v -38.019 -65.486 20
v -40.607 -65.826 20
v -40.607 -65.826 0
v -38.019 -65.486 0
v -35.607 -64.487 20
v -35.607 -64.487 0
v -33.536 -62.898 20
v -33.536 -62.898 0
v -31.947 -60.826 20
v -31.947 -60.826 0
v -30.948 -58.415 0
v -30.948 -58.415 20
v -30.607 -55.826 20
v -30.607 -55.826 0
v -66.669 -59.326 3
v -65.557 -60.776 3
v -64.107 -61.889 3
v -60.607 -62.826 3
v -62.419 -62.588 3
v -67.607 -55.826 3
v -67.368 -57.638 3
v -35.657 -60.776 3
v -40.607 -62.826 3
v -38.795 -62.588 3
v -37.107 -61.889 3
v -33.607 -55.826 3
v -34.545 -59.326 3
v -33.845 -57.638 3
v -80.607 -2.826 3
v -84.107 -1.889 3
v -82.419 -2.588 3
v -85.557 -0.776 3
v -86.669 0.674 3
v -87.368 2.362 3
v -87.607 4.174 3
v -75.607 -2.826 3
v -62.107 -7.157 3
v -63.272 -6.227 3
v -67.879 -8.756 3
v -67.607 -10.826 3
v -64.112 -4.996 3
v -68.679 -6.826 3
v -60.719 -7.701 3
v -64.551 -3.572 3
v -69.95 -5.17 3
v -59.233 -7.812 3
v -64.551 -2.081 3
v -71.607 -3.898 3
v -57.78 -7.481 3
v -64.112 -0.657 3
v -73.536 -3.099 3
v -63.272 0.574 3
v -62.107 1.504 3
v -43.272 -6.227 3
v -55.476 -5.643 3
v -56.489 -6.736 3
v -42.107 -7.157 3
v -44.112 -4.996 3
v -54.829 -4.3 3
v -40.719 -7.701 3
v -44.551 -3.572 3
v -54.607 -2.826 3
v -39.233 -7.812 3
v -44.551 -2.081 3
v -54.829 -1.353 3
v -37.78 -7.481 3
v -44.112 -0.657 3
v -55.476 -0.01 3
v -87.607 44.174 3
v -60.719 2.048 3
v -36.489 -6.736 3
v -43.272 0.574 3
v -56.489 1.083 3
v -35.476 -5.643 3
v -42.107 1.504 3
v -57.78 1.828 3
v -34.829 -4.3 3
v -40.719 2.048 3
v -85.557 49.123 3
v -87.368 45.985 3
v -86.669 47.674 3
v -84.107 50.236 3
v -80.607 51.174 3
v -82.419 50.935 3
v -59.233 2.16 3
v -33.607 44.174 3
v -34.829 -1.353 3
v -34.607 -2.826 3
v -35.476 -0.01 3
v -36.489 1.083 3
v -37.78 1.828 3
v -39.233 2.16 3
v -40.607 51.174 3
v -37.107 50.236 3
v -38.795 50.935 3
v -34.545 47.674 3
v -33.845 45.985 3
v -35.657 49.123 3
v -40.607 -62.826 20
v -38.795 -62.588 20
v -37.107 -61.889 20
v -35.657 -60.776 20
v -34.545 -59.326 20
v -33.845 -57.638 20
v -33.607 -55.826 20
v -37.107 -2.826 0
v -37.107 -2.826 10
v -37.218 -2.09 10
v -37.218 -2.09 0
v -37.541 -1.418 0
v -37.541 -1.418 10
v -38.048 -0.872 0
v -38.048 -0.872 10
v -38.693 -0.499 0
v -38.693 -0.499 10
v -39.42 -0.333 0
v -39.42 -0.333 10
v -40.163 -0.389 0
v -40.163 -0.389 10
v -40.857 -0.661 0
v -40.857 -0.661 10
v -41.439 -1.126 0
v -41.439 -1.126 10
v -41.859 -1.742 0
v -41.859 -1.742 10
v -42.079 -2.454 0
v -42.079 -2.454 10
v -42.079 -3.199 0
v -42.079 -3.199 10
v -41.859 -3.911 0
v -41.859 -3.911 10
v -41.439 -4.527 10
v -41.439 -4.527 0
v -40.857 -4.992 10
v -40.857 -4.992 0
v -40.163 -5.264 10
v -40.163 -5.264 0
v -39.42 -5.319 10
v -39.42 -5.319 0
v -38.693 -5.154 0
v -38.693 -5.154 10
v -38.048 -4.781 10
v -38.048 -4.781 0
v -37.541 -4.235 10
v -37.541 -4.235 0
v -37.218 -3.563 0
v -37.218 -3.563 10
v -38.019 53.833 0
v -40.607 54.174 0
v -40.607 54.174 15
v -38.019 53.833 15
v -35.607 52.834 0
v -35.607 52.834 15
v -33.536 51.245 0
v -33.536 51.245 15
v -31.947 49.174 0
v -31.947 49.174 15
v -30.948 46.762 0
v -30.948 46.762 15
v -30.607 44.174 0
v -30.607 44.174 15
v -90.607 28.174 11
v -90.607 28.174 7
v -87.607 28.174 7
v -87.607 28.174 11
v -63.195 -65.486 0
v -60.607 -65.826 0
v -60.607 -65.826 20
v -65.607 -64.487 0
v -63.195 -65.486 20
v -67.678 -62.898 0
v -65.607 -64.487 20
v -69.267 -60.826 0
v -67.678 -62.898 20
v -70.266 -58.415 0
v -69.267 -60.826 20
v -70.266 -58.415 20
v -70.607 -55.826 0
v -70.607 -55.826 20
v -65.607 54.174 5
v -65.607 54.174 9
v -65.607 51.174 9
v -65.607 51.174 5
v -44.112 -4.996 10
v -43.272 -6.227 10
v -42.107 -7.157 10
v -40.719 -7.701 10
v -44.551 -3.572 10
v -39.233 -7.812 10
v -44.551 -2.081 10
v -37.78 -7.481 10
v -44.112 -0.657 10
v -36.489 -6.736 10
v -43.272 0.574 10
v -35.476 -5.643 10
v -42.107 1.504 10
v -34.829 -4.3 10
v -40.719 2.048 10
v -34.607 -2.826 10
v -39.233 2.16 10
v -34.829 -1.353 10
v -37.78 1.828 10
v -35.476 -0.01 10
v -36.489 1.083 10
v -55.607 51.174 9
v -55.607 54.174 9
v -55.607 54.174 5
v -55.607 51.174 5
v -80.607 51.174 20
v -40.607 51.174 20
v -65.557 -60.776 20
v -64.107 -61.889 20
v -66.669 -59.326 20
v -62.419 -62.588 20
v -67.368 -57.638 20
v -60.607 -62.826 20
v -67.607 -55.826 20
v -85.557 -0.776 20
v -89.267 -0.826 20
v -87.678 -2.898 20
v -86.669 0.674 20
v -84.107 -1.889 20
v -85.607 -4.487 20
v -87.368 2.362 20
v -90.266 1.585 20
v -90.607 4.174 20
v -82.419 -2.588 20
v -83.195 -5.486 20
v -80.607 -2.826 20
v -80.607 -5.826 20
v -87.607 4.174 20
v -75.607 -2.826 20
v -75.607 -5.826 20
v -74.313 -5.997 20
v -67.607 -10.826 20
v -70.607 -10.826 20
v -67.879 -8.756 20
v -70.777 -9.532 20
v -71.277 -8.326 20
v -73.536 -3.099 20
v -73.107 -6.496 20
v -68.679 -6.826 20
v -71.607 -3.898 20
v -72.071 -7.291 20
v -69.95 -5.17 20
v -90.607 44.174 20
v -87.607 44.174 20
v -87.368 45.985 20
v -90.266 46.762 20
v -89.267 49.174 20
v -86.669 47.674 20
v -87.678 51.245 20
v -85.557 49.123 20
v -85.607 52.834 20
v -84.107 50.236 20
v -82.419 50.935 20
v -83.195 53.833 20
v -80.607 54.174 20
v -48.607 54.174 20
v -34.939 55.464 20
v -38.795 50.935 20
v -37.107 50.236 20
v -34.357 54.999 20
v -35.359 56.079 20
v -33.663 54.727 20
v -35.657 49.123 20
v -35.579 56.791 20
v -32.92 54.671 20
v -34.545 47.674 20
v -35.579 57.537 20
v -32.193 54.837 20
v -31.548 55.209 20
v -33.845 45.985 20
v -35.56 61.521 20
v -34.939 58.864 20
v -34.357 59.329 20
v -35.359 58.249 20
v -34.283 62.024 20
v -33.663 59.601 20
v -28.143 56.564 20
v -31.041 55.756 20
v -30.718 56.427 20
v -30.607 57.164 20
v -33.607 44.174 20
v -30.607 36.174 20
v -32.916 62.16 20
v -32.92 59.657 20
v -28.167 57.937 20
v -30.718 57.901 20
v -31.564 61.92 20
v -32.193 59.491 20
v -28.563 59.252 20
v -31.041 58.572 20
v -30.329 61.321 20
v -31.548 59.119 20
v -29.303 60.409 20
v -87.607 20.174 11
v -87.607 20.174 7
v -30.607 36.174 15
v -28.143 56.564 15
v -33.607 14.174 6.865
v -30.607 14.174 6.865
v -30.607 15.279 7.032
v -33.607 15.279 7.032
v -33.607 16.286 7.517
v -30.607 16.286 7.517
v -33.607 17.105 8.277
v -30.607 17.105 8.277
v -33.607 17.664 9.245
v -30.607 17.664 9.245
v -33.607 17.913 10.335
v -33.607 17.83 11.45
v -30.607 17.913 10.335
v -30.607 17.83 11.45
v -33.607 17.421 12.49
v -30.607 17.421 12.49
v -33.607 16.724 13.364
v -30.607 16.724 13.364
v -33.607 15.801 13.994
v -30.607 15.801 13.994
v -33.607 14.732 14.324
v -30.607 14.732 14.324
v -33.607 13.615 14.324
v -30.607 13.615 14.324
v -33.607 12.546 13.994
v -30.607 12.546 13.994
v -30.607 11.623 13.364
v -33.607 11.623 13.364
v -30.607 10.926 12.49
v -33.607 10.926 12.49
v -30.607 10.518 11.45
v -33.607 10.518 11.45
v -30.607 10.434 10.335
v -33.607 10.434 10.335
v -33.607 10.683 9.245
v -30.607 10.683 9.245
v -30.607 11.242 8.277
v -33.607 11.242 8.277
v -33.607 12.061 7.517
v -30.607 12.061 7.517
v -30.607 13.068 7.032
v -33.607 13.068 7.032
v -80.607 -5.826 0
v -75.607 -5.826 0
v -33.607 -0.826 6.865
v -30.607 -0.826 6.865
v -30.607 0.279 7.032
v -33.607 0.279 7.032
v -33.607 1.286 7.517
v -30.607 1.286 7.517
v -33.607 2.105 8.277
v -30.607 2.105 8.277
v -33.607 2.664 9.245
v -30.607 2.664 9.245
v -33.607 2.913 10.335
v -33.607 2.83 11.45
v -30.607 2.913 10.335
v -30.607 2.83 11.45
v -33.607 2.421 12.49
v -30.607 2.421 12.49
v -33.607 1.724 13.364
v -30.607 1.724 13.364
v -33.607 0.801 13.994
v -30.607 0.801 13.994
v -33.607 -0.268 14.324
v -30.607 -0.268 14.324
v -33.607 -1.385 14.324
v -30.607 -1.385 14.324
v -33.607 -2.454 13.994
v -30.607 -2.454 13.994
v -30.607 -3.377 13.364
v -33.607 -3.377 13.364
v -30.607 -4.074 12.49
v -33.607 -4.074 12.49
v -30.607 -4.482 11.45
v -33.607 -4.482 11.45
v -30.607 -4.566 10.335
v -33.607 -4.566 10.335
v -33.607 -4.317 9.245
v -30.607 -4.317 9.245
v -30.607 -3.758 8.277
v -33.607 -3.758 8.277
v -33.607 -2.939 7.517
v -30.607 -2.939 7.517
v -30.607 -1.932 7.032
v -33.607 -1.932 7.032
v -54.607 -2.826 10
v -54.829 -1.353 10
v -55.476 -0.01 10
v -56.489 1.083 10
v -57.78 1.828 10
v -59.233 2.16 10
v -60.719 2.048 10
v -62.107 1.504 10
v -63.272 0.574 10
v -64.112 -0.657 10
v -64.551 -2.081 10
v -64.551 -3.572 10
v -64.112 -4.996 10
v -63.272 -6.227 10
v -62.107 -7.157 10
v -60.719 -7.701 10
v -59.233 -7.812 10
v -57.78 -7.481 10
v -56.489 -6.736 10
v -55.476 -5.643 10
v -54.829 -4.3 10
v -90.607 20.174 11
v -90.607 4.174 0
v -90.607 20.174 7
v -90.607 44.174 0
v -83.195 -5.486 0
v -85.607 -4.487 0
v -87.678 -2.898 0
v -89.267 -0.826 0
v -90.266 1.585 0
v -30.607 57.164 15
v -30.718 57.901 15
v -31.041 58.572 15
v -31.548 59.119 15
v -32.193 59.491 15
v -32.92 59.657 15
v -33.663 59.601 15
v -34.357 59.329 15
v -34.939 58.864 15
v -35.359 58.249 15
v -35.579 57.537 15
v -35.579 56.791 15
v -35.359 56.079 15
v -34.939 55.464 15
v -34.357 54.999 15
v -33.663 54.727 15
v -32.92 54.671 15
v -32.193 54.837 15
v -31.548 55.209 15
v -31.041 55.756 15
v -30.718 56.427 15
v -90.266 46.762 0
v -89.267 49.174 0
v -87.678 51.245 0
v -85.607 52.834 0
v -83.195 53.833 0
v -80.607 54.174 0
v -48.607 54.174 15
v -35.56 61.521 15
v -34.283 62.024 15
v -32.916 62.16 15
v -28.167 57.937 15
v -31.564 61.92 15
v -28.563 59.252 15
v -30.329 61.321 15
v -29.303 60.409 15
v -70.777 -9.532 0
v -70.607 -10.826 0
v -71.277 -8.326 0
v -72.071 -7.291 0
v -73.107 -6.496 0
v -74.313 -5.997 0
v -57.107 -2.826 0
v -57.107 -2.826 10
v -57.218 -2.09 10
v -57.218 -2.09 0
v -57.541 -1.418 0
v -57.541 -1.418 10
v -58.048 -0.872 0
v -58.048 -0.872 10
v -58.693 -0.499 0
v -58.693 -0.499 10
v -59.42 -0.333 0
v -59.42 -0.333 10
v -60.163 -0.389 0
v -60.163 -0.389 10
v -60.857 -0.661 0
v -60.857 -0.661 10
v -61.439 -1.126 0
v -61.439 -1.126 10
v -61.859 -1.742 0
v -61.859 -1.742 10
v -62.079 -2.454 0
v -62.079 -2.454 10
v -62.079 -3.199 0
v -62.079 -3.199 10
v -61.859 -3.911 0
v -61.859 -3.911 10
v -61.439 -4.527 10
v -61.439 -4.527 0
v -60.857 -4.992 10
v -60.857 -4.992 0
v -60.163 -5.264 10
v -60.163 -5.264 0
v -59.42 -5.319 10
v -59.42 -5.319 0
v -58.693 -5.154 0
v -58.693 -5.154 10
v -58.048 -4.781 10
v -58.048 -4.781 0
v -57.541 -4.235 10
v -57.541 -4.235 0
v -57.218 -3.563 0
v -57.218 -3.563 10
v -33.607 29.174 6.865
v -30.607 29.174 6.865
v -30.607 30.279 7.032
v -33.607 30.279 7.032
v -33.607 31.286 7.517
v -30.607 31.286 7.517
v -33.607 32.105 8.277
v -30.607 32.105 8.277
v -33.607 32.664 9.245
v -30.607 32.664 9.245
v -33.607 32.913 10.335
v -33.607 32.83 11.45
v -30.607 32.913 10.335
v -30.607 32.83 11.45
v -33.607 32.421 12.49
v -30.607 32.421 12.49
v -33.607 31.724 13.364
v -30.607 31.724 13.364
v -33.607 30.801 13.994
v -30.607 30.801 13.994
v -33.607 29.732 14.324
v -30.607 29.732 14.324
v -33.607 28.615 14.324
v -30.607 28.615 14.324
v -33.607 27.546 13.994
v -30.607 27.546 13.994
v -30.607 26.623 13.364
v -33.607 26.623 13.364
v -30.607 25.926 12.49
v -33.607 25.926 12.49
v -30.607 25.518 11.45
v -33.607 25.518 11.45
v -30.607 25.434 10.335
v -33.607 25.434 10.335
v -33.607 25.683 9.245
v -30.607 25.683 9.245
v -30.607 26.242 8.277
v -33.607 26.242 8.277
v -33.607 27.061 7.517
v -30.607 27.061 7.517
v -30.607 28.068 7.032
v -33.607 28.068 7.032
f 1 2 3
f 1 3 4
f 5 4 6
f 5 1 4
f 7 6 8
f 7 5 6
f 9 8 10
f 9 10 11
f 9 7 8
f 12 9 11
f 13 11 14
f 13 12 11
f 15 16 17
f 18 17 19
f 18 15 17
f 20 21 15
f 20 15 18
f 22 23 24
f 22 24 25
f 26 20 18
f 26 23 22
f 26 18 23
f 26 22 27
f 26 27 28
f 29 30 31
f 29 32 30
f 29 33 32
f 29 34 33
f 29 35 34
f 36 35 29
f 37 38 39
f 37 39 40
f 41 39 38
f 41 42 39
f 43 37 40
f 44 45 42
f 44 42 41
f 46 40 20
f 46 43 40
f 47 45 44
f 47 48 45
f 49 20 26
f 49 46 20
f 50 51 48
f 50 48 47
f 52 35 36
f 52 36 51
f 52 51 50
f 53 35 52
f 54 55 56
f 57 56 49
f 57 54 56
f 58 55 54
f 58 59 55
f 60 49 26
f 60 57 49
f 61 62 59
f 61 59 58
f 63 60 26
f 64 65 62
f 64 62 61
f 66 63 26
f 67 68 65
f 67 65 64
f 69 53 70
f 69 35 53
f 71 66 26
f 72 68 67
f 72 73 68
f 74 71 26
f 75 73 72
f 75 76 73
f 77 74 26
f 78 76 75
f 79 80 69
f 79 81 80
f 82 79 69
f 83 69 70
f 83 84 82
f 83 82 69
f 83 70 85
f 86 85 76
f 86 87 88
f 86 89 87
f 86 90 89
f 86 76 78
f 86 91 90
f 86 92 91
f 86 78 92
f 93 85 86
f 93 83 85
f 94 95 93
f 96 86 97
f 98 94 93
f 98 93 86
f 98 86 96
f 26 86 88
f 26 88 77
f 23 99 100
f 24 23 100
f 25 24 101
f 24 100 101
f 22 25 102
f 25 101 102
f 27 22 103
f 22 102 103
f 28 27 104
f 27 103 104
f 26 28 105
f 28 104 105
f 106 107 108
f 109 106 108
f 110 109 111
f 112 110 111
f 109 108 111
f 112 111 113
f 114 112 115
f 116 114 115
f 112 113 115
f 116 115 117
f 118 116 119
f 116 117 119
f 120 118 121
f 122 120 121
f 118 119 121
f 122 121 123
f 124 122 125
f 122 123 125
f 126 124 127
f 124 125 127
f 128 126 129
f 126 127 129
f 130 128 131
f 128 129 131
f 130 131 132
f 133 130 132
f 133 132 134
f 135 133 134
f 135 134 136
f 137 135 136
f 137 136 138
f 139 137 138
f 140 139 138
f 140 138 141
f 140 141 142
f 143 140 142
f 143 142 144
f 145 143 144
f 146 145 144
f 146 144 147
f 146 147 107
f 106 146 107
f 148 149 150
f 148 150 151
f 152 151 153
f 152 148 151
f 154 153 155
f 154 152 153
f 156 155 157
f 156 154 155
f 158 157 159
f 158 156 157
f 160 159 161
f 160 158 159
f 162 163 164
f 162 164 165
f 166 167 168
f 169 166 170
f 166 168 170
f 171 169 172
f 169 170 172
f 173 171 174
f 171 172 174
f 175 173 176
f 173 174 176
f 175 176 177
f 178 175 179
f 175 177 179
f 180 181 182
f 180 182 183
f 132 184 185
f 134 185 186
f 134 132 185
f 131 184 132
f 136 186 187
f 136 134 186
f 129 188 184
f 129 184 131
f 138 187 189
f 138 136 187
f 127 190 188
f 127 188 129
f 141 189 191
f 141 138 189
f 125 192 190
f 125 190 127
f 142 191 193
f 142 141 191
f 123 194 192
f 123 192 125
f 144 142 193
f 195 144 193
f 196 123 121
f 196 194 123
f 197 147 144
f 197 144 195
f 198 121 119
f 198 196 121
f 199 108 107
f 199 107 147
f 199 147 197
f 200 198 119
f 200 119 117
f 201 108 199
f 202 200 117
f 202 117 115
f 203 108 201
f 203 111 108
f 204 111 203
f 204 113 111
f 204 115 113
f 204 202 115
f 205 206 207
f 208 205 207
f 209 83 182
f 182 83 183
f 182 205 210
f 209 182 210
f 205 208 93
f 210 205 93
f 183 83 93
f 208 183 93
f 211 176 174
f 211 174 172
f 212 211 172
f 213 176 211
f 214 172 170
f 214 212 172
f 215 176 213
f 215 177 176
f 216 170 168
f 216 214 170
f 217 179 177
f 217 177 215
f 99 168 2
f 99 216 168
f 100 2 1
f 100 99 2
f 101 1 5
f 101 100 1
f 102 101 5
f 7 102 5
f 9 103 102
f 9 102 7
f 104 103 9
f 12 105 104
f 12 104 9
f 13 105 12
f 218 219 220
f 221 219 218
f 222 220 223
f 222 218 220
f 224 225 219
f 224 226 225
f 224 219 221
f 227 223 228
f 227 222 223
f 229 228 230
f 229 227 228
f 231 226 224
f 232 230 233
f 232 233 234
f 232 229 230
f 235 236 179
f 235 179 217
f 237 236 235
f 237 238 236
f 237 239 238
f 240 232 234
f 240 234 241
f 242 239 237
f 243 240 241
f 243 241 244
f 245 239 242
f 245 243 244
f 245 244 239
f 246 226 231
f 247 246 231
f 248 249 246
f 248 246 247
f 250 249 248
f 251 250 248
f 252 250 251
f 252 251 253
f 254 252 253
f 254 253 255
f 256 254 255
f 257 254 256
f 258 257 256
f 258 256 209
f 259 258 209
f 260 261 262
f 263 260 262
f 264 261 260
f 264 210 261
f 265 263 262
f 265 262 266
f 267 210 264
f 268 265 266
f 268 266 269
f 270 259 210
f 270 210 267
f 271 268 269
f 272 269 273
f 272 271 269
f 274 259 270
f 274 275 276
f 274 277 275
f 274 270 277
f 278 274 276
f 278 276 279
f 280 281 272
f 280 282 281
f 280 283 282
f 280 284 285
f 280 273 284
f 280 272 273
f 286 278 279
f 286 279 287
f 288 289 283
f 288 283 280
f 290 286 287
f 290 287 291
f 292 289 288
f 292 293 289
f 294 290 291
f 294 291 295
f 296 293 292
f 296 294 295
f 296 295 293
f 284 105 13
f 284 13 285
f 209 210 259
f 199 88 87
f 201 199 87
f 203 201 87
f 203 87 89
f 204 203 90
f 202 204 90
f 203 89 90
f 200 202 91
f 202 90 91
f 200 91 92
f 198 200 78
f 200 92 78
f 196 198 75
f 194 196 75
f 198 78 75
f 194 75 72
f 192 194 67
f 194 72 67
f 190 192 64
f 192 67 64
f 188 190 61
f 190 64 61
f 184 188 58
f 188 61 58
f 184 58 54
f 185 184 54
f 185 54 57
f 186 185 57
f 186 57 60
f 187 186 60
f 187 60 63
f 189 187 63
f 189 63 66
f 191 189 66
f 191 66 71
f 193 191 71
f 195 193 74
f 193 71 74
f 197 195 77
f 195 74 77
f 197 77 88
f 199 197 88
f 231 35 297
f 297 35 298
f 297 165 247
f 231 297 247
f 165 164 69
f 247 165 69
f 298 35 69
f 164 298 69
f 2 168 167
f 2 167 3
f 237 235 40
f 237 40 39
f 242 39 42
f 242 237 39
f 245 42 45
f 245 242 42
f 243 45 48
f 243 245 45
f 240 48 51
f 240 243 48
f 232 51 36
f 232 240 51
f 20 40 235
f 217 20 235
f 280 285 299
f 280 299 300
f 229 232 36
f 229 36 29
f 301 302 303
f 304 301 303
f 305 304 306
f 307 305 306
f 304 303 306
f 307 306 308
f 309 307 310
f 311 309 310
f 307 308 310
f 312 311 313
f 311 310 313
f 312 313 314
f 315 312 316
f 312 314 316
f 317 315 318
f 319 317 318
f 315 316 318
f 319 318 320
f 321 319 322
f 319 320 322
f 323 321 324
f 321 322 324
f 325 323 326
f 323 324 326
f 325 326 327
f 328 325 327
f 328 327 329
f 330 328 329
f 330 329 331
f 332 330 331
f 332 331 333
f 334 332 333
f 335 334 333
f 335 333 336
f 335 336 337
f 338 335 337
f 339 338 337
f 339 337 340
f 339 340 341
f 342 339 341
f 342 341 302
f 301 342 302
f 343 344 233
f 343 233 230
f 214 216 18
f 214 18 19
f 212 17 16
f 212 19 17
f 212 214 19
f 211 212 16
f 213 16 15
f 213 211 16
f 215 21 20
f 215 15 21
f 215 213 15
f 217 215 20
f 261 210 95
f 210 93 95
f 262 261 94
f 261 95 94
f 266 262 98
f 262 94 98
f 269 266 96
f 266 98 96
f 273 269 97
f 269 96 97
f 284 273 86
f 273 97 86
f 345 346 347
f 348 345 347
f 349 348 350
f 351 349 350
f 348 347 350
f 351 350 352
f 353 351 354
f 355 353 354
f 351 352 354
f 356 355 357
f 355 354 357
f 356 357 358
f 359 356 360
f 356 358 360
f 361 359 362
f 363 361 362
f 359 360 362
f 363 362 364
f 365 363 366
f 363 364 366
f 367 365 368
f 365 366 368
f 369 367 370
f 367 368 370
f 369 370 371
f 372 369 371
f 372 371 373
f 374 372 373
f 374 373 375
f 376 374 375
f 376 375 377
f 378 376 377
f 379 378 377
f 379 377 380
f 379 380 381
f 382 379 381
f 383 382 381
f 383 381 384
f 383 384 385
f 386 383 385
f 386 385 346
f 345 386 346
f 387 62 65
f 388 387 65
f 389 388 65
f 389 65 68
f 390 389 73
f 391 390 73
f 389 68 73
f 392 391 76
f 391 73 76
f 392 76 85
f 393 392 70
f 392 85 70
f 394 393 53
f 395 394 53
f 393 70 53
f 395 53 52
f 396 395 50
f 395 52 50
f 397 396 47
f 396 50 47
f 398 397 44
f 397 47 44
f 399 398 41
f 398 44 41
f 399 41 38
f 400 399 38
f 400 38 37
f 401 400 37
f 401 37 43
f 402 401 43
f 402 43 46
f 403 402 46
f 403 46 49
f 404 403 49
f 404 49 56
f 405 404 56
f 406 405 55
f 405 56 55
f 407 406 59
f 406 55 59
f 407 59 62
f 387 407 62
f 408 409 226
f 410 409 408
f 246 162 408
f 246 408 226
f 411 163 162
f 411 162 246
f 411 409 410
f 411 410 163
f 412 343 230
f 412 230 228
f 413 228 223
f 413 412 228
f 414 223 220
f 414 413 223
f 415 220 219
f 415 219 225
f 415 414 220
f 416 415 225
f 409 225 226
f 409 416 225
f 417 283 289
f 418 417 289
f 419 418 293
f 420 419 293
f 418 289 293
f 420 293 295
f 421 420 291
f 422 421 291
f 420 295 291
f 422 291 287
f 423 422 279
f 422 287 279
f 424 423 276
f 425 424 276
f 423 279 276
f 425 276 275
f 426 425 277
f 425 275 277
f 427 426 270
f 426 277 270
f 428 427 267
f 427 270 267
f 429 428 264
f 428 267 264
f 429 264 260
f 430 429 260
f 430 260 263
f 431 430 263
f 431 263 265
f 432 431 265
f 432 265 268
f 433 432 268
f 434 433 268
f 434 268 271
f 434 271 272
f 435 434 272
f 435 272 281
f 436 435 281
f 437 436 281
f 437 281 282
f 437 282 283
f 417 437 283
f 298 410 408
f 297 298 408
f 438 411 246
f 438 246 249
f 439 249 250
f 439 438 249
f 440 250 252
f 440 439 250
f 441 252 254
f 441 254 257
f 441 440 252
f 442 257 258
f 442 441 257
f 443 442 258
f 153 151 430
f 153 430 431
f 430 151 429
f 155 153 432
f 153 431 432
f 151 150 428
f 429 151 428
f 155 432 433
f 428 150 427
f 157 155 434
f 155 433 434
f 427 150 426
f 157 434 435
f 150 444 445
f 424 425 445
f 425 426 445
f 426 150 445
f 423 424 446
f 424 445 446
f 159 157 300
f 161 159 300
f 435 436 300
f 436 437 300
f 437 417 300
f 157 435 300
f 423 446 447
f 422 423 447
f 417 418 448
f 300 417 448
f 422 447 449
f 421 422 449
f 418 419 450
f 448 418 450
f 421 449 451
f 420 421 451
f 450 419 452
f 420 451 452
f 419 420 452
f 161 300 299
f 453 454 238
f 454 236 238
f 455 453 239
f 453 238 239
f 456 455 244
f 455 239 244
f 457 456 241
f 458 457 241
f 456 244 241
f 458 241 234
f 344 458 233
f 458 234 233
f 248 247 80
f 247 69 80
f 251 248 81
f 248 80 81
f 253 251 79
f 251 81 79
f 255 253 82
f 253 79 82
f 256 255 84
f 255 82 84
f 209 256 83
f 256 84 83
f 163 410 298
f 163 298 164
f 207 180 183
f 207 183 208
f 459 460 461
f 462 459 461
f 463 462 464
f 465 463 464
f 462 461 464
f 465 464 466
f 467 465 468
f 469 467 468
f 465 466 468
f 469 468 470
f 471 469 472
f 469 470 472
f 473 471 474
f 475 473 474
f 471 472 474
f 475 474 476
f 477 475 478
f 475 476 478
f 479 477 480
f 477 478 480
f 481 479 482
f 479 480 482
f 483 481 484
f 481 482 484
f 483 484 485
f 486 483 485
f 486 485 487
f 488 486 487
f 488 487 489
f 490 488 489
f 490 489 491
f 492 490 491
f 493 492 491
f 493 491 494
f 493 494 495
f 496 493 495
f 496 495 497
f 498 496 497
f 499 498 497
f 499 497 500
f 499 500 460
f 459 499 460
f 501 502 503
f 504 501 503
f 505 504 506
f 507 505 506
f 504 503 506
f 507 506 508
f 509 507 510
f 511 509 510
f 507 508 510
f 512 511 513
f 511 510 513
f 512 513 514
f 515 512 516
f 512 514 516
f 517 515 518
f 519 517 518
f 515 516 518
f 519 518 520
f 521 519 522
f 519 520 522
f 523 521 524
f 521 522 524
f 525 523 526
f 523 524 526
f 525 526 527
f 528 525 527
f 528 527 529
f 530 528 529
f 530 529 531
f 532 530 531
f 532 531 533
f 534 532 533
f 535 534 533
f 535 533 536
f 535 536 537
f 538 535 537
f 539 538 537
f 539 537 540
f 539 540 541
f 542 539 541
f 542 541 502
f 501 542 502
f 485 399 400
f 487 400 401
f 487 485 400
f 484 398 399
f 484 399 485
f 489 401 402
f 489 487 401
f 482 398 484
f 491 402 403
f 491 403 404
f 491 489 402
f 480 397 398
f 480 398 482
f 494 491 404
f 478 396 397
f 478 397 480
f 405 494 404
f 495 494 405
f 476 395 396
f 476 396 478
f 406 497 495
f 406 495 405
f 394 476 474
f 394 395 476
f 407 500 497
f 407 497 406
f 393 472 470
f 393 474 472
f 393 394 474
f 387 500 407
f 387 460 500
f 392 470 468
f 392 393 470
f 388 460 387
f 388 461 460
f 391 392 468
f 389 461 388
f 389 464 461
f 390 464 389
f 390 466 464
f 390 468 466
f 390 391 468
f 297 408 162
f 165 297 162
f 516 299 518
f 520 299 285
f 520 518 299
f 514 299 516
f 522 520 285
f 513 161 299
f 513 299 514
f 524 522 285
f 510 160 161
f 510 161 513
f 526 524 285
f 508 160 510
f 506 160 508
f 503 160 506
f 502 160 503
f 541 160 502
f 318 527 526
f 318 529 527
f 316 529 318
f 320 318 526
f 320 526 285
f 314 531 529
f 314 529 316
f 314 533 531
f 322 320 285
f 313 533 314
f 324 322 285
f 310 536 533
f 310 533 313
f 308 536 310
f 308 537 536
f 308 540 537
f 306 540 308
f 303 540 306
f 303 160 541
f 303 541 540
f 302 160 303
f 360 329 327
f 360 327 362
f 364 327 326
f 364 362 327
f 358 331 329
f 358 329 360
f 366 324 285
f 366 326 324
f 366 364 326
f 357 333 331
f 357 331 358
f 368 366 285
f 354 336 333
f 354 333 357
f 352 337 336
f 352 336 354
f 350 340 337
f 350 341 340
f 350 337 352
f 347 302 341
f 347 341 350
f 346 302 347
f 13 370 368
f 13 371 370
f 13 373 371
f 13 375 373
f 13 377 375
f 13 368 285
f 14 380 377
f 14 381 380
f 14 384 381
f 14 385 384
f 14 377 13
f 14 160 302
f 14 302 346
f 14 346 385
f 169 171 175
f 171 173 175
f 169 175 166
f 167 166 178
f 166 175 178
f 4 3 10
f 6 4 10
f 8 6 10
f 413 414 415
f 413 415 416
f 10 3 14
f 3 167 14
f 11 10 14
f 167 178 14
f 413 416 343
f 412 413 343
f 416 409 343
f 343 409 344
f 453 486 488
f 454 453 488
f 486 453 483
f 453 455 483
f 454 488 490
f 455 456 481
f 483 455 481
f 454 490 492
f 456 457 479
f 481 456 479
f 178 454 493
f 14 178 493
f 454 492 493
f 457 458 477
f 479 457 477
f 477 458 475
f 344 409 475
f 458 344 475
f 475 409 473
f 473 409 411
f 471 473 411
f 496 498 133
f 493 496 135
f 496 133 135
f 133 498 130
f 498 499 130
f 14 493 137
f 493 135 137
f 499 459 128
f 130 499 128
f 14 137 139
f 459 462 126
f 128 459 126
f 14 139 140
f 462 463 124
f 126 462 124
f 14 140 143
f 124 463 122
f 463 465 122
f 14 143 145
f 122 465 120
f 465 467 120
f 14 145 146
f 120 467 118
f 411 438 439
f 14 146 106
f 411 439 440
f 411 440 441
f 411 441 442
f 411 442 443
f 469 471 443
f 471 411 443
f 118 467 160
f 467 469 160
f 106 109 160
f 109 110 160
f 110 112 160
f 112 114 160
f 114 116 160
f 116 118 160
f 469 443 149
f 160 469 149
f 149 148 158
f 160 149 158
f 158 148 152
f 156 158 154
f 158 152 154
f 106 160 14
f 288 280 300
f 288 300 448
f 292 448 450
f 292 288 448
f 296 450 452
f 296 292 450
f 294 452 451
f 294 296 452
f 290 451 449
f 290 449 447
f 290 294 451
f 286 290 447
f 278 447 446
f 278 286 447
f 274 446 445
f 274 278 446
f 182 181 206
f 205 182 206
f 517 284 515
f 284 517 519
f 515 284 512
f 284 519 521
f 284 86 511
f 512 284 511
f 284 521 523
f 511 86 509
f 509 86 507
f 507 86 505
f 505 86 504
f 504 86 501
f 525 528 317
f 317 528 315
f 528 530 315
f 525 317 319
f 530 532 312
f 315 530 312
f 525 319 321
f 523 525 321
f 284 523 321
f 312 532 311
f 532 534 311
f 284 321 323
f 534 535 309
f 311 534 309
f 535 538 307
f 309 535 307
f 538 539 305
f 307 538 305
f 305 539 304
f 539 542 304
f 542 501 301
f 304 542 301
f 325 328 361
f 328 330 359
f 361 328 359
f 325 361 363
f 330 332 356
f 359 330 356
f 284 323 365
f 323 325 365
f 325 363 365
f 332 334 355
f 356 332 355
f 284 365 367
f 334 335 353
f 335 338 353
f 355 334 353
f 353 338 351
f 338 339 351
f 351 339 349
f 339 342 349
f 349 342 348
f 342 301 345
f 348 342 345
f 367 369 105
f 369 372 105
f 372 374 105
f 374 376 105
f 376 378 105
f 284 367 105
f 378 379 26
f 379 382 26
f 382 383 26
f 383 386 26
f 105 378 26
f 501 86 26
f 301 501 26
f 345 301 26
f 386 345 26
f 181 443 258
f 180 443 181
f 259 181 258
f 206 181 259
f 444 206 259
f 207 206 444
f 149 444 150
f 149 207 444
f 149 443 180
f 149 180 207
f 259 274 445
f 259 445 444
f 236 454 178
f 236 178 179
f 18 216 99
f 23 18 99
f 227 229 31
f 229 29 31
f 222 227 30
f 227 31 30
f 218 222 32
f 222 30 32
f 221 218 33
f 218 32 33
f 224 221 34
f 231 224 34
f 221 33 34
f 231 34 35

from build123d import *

# Parameters (mm, degrees)
SALIENTE_EXTRUIR1_DEPTH      = 50
SALIENTE_EXTRUIR2_DEPTH      = 60
SALIENTE_EXTRUIR2_DEPTH_BACK = 31
CROQUIS2_W                   = 40
CROQUIS2_H                   = 50
REDONDEO1_R                  = 10
REDONDEO2_R                  = 10
CORTAR_EXTRUIR2_DEPTH        = 76
REDONDEO6_R                  = 5
VACIADO2_T                   = -3
CROQUIS4_R                   = 5
SALIENTE_EXTRUIR3_DEPTH      = 7
CROQUIS5_R                   = 2.5
CORTAR_EXTRUIR3_DEPTH        = 113.43981765
SALIENTE_EXTRUIR4_START      = -5
SALIENTE_EXTRUIR4_DEPTH      = 5
CROQUIS6_4_R                 = 2.5
CORTAR_EXTRUIR4_DEPTH        = 114.766043234
CORTAR_EXTRUIR7_REACH        = 93.286
CROQUIS8_R                   = 3.75
CORTAR_EXTRUIR8_REACH        = 94.948
CROQUIS9_W                   = 4
CROQUIS9_H                   = 8
CORTAR_EXTRUIR9_REACH        = 153.689
CROQUIS10_W                  = 10
CROQUIS10_H                  = 4


with BuildPart() as part:
    # Croquis1 → Saliente-Extruir1 (new body)
    with BuildSketch(Plane.XY):
        with BuildLine():
            Line((-80.606796451, 54.173553719), (-40.606796451, 54.173553719))
            ThreePointArc((-40.606796451, 54.173553719), (-33.53572864, 51.244621531), (-30.606796451, 44.173553719))
            Line((-30.606796451, 44.173553719), (-30.606796451, 4.173553719))
            ThreePointArc((-30.606796451, 4.173553719), (-33.53572864, -2.897514093), (-40.606796451, -5.826446281))
            Line((-40.606796451, -5.826446281), (-80.606796451, -5.826446281))
            ThreePointArc((-80.606796451, -5.826446281), (-87.677864263, -2.897514093), (-90.606796451, 4.173553719))
            Line((-90.606796451, 4.173553719), (-90.606796451, 44.173553719))
            ThreePointArc((-90.606796451, 44.173553719), (-87.677864263, 51.244621531), (-80.606796451, 54.173553719))
        make_face()
    extrude(amount=SALIENTE_EXTRUIR1_DEPTH)

    # Croquis2 → Saliente-Extruir2 (add, two sides: drawn at the far end of the back side and taken through both)
    with BuildSketch(Plane.XZ.offset(5.826446281).offset(-SALIENTE_EXTRUIR2_DEPTH_BACK)):
        with Locations((-50.606796451, 25)):
            Rectangle(CROQUIS2_W, CROQUIS2_H)
    extrude(amount=SALIENTE_EXTRUIR2_DEPTH + SALIENTE_EXTRUIR2_DEPTH_BACK)

    # Redondeo1
    redondeo1_edges = [part.edges().sort_by_distance(p)[0] for p in [
        (-30.606796451, -65.826446281, 25),
    ]]
    fillet(redondeo1_edges, radius=REDONDEO1_R)

    # Redondeo2
    redondeo2_edges = [part.edges().sort_by_distance(p)[0] for p in [
        (-70.606796451, -65.826446281, 25),
    ]]
    fillet(redondeo2_edges, radius=REDONDEO2_R)

    # Croquis3 → Cortar-Extruir2 (cut)
    with BuildSketch(Plane(origin=(-30.606796451, 0, 0), x_dir=(0, 0, -1), z_dir=(1, 0, 0))):
        Polygon((-20, -55.826446281), (-20, 57.222275959), (-50, 57.222275959), (-50, -55.826446281), (-50, -71.304791729), (-20, -71.304791729), align=None)
    extrude(amount=-CORTAR_EXTRUIR2_DEPTH, mode=Mode.SUBTRACT)

    # Redondeo6
    redondeo6_edges = [part.edges().sort_by_distance(p)[0] for p in [
        (-70.606796451, -5.826446281, 10),
    ]]
    fillet(redondeo6_edges, radius=REDONDEO6_R)

    # Vaciado2
    vaciado2_openings = [part.faces().sort_by_distance(p)[0] for p in [
        (-56.519519035, 0.268108162, 20),
    ]]
    offset(amount=VACIADO2_T, openings=vaciado2_openings, kind=Kind.INTERSECTION)

    # Croquis4 → Saliente-Extruir3 (add)
    with BuildSketch(Plane.XY.offset(3)):
        with Locations((-39.606796451, -2.826446281)):
            Circle(CROQUIS4_R)
        with Locations((-59.606796451, -2.826446281)):
            Circle(CROQUIS4_R)
    extrude(amount=SALIENTE_EXTRUIR3_DEPTH)

    # Croquis5 → Cortar-Extruir3 (cut, through all)
    with BuildSketch(Plane.XY.offset(10)):
        with Locations((-59.606796451, -2.826446281)):
            Circle(CROQUIS5_R)
        with Locations((-39.606796451, -2.826446281)):
            Circle(CROQUIS5_R)
    extrude(amount=-CORTAR_EXTRUIR3_DEPTH, mode=Mode.SUBTRACT)

    # Croquis6 → Saliente-Extruir4 (add)
    with BuildSketch(Plane.XY.offset(20).offset(SALIENTE_EXTRUIR4_START)):
        with BuildLine():
            Line((-35.560225021, 61.520617947), (-48.606796451, 54.173553719))
            Line((-48.606796451, 54.173553719), (-40.606796451, 54.173553719))
            ThreePointArc((-40.606796451, 54.173553719), (-33.53572864, 51.244621531), (-30.606796451, 44.173553719))
            Line((-30.606796451, 44.173553719), (-30.606796451, 36.173553719))
            Line((-30.606796451, 36.173553719), (-28.142904197, 56.564123399))
            ThreePointArc((-28.142904197, 56.564123399), (-30.328790596, 61.321179473), (-35.560225021, 61.520617947))
        make_face()
    extrude(amount=SALIENTE_EXTRUIR4_DEPTH)

    # Croquis6<4> → Cortar-Extruir4 (cut, through all)
    with BuildSketch(Plane.XY.offset(20)):
        with Locations((-33.106796451, 57.163934776)):
            Circle(CROQUIS6_4_R)
    extrude(amount=-CORTAR_EXTRUIR4_DEPTH, mode=Mode.SUBTRACT)

    # Croquis8 → Cortar-Extruir7 (cut, up to next)
    with BuildSketch(Plane(origin=(-30.606796451, 0, 0), x_dir=(0, 0, -1), z_dir=(1, 0, 0)), mode=Mode.PRIVATE) as cortar_extruir7_sk1:
        with Locations((-10.615433885, 29.173553719)):
            Circle(CROQUIS8_R)
    cortar_extruir7_tool1 = extrude(cortar_extruir7_sk1.sketch, amount=-CORTAR_EXTRUIR7_REACH, mode=Mode.PRIVATE) & part.part
    # Croquis8 → Cortar-Extruir7 (cut, up to next)
    with BuildSketch(Plane(origin=(-30.606796451, 0, 0), x_dir=(0, 0, -1), z_dir=(1, 0, 0)), mode=Mode.PRIVATE) as cortar_extruir7_sk2:
        with Locations((-10.615433885, 14.173553719)):
            Circle(CROQUIS8_R)
    cortar_extruir7_tool2 = extrude(cortar_extruir7_sk2.sketch, amount=-CORTAR_EXTRUIR7_REACH, mode=Mode.PRIVATE) & part.part
    # Croquis8 → Cortar-Extruir7 (cut, up to next)
    with BuildSketch(Plane(origin=(-30.606796451, 0, 0), x_dir=(0, 0, -1), z_dir=(1, 0, 0)), mode=Mode.PRIVATE) as cortar_extruir7_sk3:
        with Locations((-10.615433885, -0.826446281)):
            Circle(CROQUIS8_R)
    cortar_extruir7_tool3 = extrude(cortar_extruir7_sk3.sketch, amount=-CORTAR_EXTRUIR7_REACH, mode=Mode.PRIVATE) & part.part
    add(cortar_extruir7_tool1.solids().sort_by_distance((-30.606796, 29.173554, 10.615434))[0], mode=Mode.SUBTRACT)
    add(cortar_extruir7_tool2.solids().sort_by_distance((-30.606796, 14.173554, 10.615434))[0], mode=Mode.SUBTRACT)
    add(cortar_extruir7_tool3.solids().sort_by_distance((-30.606796, -0.826446, 10.615434))[0], mode=Mode.SUBTRACT)

    # Croquis9 → Cortar-Extruir8 (cut, up to next)
    with BuildSketch(Plane.ZY.offset(90.606796451), mode=Mode.PRIVATE) as cortar_extruir8_sk1:
        with Locations((9, 24.173553719)):
            Rectangle(CROQUIS9_W, CROQUIS9_H)
    cortar_extruir8_tool1 = extrude(cortar_extruir8_sk1.sketch, amount=-CORTAR_EXTRUIR8_REACH, mode=Mode.PRIVATE) & part.part
    add(cortar_extruir8_tool1.solids().sort_by_distance((-90.606796, 24.173554, 9))[0], mode=Mode.SUBTRACT)

    # Croquis10 → Cortar-Extruir9 (cut, up to next)
    with BuildSketch(Plane(origin=(0, 54.173553719, 0), x_dir=(1, 0, 0), z_dir=(0, 1, 0)), mode=Mode.PRIVATE) as cortar_extruir9_sk1:
        with Locations((-60.606796451, -7)):
            Rectangle(CROQUIS10_W, CROQUIS10_H)
    cortar_extruir9_tool1 = extrude(cortar_extruir9_sk1.sketch, amount=-CORTAR_EXTRUIR9_REACH, mode=Mode.PRIVATE) & part.part
    add(cortar_extruir9_tool1.solids().sort_by_distance((-60.606796, 54.173554, 7))[0], mode=Mode.SUBTRACT)


solid = part.part
